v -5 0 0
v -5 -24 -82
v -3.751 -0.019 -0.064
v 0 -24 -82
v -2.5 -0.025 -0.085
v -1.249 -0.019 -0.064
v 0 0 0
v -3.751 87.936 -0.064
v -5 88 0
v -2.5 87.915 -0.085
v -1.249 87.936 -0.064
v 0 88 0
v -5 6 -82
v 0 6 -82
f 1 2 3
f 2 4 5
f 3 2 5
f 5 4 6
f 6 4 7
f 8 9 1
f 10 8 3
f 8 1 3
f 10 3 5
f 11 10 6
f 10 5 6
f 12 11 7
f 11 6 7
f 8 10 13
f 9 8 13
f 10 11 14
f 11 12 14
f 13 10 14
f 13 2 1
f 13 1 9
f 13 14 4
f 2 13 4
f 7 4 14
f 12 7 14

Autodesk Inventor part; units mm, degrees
ref_plane "YZ Plane" through (0, 0, 0) normal (1, 0, 0) x (0, 1, 0)
ref_plane "XZ Plane" through (0, 0, 0) normal (0, 1, 0) x (-1, 0, 0)
ref_plane "XY Plane" through (0, 0, 0) normal (0, 0, 1) x (1, 0, 0)
sketch "Sketch1" plane through (0, 0, 0) normal (1, 0, 0) x (0, 1, 0)
  line L0 (0, 0) -> (88, 0)
  line L1 (88, 0) -> (204.3575, 0) construction
  line L2 (88, 0) -> (6, -82)
  line L3 (88, 0) -> (171.4386, 0) construction
  line L4 (6, -82) -> (-24, -82)
  line L5 (-24, -82) -> (0, 0)
  dimension "d0" = 88
  dimension "d3" = 135
  dimension "d4" = 30
extrude "Extrusion1" add sketch "Sketch1" against normal blind 5
sketch "Sketch2" plane through (0, 0, 0) normal (0, 1, 0) x (-1, 0, 0)
  line L0 (0, 0) -> (5, 0) projected
  circle A0 centre (2.5, 0) radius 36.5
  line L1 (0, 0) -> (0, -82) projected
  circle A1 centre (2.5, 36.5) radius 36.5855
  line L2 (5, -82) -> (5, 0) projected
  line L3 (0, 0) -> (5, 0)
  dimension "d7" = 73
extrude "Extrusion2" cut sketch "Sketch2" along normal mid plane 197.25 contours L0 A1
properties part number "Aletas" material "Birch"
